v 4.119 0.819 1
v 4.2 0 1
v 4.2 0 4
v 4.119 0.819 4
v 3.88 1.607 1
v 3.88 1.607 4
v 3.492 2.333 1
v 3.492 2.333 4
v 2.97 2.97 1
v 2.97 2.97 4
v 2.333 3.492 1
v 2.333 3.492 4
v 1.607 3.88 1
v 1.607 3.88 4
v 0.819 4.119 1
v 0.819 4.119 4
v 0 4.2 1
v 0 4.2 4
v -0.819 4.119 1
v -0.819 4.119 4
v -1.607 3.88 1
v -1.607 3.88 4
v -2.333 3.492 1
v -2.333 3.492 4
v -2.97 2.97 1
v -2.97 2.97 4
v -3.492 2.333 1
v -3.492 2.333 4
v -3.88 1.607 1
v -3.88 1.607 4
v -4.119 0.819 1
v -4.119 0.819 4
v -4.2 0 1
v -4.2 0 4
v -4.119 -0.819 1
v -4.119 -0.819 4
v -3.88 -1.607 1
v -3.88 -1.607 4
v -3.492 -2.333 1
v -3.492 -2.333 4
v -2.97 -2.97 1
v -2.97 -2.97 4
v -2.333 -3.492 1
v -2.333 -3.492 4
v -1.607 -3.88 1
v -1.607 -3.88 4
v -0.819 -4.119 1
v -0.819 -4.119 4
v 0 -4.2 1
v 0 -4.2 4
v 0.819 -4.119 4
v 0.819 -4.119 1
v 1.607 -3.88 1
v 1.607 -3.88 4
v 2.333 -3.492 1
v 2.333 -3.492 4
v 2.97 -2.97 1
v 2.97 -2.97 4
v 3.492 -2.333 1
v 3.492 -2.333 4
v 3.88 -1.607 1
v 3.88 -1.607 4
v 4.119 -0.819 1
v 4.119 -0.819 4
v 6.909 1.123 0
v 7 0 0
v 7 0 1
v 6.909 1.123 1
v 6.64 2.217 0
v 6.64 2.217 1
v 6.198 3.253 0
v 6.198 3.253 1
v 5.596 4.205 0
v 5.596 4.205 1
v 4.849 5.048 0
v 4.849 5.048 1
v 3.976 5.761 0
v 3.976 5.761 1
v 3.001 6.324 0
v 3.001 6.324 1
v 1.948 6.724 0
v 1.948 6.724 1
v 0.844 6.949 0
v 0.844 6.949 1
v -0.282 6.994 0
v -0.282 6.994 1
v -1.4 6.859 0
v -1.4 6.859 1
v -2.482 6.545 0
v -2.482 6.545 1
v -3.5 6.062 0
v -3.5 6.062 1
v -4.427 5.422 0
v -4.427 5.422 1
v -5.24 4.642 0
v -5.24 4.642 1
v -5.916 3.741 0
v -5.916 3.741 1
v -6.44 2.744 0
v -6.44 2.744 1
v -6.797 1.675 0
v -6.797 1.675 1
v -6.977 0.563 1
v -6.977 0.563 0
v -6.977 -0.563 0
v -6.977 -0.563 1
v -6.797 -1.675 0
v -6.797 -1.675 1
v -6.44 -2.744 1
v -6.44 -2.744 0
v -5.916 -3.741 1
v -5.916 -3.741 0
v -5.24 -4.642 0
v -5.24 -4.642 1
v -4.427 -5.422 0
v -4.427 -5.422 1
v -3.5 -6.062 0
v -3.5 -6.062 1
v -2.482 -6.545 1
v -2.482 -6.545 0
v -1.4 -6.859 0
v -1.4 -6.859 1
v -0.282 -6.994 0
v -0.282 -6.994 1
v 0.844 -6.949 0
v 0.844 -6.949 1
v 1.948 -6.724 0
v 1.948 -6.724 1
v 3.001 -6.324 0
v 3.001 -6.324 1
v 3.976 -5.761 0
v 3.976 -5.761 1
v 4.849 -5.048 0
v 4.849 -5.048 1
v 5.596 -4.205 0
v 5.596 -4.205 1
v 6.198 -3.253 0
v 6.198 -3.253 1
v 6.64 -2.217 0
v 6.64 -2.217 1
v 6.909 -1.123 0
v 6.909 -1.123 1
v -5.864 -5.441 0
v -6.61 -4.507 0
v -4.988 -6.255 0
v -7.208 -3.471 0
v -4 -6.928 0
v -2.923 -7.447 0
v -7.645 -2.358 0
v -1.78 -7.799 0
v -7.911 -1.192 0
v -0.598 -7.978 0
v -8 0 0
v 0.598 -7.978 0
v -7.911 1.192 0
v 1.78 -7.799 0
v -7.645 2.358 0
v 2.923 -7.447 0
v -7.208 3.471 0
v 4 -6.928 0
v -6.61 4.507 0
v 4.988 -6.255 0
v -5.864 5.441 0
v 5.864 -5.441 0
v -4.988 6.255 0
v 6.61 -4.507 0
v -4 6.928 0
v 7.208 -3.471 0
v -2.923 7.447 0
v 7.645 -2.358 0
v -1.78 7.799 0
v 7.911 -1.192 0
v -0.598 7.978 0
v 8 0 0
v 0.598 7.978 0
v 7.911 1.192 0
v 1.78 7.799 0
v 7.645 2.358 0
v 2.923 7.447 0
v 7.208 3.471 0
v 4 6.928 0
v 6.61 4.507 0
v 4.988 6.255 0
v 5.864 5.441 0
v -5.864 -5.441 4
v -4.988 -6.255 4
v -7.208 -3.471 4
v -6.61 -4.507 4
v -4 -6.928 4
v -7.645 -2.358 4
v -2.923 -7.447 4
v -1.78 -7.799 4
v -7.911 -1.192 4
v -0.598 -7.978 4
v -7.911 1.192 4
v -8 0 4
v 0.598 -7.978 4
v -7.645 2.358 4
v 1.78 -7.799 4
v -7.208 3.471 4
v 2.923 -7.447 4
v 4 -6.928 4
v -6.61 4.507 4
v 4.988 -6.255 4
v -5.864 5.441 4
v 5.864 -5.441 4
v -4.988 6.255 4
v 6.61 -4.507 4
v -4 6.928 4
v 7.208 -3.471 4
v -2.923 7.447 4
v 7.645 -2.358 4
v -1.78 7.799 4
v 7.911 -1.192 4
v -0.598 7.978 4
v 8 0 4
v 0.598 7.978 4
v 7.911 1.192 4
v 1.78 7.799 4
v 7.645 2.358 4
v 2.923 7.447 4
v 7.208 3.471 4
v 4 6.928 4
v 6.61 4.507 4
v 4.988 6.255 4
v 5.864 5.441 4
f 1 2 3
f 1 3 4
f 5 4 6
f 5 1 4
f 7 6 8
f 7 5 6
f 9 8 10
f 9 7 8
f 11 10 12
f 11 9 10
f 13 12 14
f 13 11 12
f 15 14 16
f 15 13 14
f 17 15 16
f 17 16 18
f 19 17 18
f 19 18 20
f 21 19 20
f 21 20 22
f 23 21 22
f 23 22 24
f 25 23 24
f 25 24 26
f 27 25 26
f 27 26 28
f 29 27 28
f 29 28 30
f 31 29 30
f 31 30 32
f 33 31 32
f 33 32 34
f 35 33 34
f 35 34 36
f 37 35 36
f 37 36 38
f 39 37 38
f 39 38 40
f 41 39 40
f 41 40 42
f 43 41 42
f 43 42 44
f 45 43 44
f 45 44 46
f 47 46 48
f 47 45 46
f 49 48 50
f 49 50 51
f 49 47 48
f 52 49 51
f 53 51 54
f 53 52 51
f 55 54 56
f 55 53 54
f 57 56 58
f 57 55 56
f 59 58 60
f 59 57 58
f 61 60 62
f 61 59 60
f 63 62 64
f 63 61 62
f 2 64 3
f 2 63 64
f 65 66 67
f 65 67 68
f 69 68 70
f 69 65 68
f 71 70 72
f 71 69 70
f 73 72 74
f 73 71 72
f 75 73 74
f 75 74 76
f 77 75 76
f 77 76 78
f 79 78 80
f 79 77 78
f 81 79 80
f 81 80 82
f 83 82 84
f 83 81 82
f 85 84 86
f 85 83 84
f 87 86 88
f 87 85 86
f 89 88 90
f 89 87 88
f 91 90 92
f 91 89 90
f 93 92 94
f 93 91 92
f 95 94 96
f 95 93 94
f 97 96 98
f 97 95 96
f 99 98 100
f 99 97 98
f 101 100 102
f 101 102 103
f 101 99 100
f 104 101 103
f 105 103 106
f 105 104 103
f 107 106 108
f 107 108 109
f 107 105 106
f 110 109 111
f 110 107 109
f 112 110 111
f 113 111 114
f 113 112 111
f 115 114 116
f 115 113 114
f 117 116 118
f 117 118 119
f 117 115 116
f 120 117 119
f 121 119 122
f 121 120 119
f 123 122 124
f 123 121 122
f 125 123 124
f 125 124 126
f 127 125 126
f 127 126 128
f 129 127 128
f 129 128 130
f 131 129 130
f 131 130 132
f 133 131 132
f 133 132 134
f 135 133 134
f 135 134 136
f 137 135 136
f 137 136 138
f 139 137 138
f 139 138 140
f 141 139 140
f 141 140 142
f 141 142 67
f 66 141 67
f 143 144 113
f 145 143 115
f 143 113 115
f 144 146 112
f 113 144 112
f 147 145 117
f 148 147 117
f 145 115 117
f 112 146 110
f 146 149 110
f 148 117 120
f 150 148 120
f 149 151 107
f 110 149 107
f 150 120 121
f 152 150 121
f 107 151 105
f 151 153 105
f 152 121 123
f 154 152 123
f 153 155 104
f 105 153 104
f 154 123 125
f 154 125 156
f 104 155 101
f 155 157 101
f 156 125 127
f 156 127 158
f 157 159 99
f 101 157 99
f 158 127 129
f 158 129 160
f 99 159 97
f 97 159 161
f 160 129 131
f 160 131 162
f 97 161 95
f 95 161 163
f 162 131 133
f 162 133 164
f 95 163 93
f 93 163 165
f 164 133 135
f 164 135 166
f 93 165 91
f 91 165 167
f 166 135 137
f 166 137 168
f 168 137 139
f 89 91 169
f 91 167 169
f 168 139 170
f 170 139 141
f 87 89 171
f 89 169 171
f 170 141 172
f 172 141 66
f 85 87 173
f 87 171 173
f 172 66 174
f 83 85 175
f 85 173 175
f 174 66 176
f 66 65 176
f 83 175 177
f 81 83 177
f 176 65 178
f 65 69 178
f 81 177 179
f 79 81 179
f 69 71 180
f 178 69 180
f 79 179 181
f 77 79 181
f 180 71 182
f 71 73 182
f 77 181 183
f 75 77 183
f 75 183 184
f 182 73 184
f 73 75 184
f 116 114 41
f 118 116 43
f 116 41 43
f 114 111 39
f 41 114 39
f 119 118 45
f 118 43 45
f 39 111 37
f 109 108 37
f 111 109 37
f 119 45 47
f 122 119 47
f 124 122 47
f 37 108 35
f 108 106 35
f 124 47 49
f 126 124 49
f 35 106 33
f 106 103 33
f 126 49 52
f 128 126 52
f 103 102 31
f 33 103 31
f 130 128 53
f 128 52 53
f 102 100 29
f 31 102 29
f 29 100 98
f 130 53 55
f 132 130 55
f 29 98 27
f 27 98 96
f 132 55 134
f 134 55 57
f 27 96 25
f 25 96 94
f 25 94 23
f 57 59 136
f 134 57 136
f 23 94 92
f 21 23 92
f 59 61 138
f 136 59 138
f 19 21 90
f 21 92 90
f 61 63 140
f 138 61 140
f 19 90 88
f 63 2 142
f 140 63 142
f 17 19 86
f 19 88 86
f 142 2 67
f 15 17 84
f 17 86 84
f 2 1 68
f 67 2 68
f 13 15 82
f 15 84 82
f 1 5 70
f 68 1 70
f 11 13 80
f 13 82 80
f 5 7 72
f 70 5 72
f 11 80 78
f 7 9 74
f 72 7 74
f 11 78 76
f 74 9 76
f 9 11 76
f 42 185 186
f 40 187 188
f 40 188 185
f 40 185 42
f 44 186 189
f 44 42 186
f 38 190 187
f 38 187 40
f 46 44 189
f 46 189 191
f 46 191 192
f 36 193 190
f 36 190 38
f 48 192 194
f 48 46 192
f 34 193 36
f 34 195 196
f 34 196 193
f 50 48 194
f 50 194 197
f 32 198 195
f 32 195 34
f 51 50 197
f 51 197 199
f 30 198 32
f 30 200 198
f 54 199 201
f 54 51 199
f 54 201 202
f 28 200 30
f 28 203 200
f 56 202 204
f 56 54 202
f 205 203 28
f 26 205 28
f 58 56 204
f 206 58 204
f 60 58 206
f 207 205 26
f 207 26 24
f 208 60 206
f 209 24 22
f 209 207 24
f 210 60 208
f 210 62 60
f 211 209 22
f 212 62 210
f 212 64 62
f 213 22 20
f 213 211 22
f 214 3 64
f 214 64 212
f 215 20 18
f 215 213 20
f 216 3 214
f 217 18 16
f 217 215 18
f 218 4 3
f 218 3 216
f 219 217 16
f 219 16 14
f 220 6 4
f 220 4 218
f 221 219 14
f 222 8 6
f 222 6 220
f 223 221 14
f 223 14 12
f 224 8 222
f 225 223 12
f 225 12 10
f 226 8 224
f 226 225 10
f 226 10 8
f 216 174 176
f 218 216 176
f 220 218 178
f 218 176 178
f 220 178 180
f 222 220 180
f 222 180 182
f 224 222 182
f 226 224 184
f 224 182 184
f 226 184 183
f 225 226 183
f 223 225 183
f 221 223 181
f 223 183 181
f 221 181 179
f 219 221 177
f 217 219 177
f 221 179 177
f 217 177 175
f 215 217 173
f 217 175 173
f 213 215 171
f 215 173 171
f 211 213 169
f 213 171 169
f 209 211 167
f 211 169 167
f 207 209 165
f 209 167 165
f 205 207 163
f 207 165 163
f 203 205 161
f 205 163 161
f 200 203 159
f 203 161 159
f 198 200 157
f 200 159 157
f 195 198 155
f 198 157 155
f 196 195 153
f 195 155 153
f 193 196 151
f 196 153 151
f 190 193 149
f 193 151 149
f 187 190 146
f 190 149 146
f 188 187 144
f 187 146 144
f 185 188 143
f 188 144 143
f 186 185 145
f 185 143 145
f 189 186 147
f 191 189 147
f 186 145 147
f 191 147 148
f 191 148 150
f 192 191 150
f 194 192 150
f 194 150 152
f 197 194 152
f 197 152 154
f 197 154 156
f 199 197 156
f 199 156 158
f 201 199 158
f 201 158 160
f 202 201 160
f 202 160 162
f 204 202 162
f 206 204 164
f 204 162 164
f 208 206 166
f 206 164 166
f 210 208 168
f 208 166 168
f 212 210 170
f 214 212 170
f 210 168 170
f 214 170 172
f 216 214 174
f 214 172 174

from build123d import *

# Parameters (mm, degrees)
CYLINDER014005855_R     = 7
CYLINDER014005855_DEPTH = 1
TUBE004_R               = 8
TUBE004_R_2             = 4.2
TUBE004_DEPTH           = 4


with BuildPart() as v_lec768:
    # Cylinder014005855 → Cylinder014005855 (new body)
    with BuildSketch(Plane.XY):
        Circle(CYLINDER014005855_R)
    extrude(amount=CYLINDER014005855_DEPTH)


with BuildPart() as ring:
    # Tube004 → Tube004 (new body)
    with BuildSketch(Plane.XY):
        Circle(TUBE004_R)
        Circle(TUBE004_R_2, mode=Mode.SUBTRACT)
    extrude(amount=TUBE004_DEPTH)

    # Cut009003003007: cut Válec768
    add(v_lec768.part, mode=Mode.SUBTRACT)


solid = ring.part
